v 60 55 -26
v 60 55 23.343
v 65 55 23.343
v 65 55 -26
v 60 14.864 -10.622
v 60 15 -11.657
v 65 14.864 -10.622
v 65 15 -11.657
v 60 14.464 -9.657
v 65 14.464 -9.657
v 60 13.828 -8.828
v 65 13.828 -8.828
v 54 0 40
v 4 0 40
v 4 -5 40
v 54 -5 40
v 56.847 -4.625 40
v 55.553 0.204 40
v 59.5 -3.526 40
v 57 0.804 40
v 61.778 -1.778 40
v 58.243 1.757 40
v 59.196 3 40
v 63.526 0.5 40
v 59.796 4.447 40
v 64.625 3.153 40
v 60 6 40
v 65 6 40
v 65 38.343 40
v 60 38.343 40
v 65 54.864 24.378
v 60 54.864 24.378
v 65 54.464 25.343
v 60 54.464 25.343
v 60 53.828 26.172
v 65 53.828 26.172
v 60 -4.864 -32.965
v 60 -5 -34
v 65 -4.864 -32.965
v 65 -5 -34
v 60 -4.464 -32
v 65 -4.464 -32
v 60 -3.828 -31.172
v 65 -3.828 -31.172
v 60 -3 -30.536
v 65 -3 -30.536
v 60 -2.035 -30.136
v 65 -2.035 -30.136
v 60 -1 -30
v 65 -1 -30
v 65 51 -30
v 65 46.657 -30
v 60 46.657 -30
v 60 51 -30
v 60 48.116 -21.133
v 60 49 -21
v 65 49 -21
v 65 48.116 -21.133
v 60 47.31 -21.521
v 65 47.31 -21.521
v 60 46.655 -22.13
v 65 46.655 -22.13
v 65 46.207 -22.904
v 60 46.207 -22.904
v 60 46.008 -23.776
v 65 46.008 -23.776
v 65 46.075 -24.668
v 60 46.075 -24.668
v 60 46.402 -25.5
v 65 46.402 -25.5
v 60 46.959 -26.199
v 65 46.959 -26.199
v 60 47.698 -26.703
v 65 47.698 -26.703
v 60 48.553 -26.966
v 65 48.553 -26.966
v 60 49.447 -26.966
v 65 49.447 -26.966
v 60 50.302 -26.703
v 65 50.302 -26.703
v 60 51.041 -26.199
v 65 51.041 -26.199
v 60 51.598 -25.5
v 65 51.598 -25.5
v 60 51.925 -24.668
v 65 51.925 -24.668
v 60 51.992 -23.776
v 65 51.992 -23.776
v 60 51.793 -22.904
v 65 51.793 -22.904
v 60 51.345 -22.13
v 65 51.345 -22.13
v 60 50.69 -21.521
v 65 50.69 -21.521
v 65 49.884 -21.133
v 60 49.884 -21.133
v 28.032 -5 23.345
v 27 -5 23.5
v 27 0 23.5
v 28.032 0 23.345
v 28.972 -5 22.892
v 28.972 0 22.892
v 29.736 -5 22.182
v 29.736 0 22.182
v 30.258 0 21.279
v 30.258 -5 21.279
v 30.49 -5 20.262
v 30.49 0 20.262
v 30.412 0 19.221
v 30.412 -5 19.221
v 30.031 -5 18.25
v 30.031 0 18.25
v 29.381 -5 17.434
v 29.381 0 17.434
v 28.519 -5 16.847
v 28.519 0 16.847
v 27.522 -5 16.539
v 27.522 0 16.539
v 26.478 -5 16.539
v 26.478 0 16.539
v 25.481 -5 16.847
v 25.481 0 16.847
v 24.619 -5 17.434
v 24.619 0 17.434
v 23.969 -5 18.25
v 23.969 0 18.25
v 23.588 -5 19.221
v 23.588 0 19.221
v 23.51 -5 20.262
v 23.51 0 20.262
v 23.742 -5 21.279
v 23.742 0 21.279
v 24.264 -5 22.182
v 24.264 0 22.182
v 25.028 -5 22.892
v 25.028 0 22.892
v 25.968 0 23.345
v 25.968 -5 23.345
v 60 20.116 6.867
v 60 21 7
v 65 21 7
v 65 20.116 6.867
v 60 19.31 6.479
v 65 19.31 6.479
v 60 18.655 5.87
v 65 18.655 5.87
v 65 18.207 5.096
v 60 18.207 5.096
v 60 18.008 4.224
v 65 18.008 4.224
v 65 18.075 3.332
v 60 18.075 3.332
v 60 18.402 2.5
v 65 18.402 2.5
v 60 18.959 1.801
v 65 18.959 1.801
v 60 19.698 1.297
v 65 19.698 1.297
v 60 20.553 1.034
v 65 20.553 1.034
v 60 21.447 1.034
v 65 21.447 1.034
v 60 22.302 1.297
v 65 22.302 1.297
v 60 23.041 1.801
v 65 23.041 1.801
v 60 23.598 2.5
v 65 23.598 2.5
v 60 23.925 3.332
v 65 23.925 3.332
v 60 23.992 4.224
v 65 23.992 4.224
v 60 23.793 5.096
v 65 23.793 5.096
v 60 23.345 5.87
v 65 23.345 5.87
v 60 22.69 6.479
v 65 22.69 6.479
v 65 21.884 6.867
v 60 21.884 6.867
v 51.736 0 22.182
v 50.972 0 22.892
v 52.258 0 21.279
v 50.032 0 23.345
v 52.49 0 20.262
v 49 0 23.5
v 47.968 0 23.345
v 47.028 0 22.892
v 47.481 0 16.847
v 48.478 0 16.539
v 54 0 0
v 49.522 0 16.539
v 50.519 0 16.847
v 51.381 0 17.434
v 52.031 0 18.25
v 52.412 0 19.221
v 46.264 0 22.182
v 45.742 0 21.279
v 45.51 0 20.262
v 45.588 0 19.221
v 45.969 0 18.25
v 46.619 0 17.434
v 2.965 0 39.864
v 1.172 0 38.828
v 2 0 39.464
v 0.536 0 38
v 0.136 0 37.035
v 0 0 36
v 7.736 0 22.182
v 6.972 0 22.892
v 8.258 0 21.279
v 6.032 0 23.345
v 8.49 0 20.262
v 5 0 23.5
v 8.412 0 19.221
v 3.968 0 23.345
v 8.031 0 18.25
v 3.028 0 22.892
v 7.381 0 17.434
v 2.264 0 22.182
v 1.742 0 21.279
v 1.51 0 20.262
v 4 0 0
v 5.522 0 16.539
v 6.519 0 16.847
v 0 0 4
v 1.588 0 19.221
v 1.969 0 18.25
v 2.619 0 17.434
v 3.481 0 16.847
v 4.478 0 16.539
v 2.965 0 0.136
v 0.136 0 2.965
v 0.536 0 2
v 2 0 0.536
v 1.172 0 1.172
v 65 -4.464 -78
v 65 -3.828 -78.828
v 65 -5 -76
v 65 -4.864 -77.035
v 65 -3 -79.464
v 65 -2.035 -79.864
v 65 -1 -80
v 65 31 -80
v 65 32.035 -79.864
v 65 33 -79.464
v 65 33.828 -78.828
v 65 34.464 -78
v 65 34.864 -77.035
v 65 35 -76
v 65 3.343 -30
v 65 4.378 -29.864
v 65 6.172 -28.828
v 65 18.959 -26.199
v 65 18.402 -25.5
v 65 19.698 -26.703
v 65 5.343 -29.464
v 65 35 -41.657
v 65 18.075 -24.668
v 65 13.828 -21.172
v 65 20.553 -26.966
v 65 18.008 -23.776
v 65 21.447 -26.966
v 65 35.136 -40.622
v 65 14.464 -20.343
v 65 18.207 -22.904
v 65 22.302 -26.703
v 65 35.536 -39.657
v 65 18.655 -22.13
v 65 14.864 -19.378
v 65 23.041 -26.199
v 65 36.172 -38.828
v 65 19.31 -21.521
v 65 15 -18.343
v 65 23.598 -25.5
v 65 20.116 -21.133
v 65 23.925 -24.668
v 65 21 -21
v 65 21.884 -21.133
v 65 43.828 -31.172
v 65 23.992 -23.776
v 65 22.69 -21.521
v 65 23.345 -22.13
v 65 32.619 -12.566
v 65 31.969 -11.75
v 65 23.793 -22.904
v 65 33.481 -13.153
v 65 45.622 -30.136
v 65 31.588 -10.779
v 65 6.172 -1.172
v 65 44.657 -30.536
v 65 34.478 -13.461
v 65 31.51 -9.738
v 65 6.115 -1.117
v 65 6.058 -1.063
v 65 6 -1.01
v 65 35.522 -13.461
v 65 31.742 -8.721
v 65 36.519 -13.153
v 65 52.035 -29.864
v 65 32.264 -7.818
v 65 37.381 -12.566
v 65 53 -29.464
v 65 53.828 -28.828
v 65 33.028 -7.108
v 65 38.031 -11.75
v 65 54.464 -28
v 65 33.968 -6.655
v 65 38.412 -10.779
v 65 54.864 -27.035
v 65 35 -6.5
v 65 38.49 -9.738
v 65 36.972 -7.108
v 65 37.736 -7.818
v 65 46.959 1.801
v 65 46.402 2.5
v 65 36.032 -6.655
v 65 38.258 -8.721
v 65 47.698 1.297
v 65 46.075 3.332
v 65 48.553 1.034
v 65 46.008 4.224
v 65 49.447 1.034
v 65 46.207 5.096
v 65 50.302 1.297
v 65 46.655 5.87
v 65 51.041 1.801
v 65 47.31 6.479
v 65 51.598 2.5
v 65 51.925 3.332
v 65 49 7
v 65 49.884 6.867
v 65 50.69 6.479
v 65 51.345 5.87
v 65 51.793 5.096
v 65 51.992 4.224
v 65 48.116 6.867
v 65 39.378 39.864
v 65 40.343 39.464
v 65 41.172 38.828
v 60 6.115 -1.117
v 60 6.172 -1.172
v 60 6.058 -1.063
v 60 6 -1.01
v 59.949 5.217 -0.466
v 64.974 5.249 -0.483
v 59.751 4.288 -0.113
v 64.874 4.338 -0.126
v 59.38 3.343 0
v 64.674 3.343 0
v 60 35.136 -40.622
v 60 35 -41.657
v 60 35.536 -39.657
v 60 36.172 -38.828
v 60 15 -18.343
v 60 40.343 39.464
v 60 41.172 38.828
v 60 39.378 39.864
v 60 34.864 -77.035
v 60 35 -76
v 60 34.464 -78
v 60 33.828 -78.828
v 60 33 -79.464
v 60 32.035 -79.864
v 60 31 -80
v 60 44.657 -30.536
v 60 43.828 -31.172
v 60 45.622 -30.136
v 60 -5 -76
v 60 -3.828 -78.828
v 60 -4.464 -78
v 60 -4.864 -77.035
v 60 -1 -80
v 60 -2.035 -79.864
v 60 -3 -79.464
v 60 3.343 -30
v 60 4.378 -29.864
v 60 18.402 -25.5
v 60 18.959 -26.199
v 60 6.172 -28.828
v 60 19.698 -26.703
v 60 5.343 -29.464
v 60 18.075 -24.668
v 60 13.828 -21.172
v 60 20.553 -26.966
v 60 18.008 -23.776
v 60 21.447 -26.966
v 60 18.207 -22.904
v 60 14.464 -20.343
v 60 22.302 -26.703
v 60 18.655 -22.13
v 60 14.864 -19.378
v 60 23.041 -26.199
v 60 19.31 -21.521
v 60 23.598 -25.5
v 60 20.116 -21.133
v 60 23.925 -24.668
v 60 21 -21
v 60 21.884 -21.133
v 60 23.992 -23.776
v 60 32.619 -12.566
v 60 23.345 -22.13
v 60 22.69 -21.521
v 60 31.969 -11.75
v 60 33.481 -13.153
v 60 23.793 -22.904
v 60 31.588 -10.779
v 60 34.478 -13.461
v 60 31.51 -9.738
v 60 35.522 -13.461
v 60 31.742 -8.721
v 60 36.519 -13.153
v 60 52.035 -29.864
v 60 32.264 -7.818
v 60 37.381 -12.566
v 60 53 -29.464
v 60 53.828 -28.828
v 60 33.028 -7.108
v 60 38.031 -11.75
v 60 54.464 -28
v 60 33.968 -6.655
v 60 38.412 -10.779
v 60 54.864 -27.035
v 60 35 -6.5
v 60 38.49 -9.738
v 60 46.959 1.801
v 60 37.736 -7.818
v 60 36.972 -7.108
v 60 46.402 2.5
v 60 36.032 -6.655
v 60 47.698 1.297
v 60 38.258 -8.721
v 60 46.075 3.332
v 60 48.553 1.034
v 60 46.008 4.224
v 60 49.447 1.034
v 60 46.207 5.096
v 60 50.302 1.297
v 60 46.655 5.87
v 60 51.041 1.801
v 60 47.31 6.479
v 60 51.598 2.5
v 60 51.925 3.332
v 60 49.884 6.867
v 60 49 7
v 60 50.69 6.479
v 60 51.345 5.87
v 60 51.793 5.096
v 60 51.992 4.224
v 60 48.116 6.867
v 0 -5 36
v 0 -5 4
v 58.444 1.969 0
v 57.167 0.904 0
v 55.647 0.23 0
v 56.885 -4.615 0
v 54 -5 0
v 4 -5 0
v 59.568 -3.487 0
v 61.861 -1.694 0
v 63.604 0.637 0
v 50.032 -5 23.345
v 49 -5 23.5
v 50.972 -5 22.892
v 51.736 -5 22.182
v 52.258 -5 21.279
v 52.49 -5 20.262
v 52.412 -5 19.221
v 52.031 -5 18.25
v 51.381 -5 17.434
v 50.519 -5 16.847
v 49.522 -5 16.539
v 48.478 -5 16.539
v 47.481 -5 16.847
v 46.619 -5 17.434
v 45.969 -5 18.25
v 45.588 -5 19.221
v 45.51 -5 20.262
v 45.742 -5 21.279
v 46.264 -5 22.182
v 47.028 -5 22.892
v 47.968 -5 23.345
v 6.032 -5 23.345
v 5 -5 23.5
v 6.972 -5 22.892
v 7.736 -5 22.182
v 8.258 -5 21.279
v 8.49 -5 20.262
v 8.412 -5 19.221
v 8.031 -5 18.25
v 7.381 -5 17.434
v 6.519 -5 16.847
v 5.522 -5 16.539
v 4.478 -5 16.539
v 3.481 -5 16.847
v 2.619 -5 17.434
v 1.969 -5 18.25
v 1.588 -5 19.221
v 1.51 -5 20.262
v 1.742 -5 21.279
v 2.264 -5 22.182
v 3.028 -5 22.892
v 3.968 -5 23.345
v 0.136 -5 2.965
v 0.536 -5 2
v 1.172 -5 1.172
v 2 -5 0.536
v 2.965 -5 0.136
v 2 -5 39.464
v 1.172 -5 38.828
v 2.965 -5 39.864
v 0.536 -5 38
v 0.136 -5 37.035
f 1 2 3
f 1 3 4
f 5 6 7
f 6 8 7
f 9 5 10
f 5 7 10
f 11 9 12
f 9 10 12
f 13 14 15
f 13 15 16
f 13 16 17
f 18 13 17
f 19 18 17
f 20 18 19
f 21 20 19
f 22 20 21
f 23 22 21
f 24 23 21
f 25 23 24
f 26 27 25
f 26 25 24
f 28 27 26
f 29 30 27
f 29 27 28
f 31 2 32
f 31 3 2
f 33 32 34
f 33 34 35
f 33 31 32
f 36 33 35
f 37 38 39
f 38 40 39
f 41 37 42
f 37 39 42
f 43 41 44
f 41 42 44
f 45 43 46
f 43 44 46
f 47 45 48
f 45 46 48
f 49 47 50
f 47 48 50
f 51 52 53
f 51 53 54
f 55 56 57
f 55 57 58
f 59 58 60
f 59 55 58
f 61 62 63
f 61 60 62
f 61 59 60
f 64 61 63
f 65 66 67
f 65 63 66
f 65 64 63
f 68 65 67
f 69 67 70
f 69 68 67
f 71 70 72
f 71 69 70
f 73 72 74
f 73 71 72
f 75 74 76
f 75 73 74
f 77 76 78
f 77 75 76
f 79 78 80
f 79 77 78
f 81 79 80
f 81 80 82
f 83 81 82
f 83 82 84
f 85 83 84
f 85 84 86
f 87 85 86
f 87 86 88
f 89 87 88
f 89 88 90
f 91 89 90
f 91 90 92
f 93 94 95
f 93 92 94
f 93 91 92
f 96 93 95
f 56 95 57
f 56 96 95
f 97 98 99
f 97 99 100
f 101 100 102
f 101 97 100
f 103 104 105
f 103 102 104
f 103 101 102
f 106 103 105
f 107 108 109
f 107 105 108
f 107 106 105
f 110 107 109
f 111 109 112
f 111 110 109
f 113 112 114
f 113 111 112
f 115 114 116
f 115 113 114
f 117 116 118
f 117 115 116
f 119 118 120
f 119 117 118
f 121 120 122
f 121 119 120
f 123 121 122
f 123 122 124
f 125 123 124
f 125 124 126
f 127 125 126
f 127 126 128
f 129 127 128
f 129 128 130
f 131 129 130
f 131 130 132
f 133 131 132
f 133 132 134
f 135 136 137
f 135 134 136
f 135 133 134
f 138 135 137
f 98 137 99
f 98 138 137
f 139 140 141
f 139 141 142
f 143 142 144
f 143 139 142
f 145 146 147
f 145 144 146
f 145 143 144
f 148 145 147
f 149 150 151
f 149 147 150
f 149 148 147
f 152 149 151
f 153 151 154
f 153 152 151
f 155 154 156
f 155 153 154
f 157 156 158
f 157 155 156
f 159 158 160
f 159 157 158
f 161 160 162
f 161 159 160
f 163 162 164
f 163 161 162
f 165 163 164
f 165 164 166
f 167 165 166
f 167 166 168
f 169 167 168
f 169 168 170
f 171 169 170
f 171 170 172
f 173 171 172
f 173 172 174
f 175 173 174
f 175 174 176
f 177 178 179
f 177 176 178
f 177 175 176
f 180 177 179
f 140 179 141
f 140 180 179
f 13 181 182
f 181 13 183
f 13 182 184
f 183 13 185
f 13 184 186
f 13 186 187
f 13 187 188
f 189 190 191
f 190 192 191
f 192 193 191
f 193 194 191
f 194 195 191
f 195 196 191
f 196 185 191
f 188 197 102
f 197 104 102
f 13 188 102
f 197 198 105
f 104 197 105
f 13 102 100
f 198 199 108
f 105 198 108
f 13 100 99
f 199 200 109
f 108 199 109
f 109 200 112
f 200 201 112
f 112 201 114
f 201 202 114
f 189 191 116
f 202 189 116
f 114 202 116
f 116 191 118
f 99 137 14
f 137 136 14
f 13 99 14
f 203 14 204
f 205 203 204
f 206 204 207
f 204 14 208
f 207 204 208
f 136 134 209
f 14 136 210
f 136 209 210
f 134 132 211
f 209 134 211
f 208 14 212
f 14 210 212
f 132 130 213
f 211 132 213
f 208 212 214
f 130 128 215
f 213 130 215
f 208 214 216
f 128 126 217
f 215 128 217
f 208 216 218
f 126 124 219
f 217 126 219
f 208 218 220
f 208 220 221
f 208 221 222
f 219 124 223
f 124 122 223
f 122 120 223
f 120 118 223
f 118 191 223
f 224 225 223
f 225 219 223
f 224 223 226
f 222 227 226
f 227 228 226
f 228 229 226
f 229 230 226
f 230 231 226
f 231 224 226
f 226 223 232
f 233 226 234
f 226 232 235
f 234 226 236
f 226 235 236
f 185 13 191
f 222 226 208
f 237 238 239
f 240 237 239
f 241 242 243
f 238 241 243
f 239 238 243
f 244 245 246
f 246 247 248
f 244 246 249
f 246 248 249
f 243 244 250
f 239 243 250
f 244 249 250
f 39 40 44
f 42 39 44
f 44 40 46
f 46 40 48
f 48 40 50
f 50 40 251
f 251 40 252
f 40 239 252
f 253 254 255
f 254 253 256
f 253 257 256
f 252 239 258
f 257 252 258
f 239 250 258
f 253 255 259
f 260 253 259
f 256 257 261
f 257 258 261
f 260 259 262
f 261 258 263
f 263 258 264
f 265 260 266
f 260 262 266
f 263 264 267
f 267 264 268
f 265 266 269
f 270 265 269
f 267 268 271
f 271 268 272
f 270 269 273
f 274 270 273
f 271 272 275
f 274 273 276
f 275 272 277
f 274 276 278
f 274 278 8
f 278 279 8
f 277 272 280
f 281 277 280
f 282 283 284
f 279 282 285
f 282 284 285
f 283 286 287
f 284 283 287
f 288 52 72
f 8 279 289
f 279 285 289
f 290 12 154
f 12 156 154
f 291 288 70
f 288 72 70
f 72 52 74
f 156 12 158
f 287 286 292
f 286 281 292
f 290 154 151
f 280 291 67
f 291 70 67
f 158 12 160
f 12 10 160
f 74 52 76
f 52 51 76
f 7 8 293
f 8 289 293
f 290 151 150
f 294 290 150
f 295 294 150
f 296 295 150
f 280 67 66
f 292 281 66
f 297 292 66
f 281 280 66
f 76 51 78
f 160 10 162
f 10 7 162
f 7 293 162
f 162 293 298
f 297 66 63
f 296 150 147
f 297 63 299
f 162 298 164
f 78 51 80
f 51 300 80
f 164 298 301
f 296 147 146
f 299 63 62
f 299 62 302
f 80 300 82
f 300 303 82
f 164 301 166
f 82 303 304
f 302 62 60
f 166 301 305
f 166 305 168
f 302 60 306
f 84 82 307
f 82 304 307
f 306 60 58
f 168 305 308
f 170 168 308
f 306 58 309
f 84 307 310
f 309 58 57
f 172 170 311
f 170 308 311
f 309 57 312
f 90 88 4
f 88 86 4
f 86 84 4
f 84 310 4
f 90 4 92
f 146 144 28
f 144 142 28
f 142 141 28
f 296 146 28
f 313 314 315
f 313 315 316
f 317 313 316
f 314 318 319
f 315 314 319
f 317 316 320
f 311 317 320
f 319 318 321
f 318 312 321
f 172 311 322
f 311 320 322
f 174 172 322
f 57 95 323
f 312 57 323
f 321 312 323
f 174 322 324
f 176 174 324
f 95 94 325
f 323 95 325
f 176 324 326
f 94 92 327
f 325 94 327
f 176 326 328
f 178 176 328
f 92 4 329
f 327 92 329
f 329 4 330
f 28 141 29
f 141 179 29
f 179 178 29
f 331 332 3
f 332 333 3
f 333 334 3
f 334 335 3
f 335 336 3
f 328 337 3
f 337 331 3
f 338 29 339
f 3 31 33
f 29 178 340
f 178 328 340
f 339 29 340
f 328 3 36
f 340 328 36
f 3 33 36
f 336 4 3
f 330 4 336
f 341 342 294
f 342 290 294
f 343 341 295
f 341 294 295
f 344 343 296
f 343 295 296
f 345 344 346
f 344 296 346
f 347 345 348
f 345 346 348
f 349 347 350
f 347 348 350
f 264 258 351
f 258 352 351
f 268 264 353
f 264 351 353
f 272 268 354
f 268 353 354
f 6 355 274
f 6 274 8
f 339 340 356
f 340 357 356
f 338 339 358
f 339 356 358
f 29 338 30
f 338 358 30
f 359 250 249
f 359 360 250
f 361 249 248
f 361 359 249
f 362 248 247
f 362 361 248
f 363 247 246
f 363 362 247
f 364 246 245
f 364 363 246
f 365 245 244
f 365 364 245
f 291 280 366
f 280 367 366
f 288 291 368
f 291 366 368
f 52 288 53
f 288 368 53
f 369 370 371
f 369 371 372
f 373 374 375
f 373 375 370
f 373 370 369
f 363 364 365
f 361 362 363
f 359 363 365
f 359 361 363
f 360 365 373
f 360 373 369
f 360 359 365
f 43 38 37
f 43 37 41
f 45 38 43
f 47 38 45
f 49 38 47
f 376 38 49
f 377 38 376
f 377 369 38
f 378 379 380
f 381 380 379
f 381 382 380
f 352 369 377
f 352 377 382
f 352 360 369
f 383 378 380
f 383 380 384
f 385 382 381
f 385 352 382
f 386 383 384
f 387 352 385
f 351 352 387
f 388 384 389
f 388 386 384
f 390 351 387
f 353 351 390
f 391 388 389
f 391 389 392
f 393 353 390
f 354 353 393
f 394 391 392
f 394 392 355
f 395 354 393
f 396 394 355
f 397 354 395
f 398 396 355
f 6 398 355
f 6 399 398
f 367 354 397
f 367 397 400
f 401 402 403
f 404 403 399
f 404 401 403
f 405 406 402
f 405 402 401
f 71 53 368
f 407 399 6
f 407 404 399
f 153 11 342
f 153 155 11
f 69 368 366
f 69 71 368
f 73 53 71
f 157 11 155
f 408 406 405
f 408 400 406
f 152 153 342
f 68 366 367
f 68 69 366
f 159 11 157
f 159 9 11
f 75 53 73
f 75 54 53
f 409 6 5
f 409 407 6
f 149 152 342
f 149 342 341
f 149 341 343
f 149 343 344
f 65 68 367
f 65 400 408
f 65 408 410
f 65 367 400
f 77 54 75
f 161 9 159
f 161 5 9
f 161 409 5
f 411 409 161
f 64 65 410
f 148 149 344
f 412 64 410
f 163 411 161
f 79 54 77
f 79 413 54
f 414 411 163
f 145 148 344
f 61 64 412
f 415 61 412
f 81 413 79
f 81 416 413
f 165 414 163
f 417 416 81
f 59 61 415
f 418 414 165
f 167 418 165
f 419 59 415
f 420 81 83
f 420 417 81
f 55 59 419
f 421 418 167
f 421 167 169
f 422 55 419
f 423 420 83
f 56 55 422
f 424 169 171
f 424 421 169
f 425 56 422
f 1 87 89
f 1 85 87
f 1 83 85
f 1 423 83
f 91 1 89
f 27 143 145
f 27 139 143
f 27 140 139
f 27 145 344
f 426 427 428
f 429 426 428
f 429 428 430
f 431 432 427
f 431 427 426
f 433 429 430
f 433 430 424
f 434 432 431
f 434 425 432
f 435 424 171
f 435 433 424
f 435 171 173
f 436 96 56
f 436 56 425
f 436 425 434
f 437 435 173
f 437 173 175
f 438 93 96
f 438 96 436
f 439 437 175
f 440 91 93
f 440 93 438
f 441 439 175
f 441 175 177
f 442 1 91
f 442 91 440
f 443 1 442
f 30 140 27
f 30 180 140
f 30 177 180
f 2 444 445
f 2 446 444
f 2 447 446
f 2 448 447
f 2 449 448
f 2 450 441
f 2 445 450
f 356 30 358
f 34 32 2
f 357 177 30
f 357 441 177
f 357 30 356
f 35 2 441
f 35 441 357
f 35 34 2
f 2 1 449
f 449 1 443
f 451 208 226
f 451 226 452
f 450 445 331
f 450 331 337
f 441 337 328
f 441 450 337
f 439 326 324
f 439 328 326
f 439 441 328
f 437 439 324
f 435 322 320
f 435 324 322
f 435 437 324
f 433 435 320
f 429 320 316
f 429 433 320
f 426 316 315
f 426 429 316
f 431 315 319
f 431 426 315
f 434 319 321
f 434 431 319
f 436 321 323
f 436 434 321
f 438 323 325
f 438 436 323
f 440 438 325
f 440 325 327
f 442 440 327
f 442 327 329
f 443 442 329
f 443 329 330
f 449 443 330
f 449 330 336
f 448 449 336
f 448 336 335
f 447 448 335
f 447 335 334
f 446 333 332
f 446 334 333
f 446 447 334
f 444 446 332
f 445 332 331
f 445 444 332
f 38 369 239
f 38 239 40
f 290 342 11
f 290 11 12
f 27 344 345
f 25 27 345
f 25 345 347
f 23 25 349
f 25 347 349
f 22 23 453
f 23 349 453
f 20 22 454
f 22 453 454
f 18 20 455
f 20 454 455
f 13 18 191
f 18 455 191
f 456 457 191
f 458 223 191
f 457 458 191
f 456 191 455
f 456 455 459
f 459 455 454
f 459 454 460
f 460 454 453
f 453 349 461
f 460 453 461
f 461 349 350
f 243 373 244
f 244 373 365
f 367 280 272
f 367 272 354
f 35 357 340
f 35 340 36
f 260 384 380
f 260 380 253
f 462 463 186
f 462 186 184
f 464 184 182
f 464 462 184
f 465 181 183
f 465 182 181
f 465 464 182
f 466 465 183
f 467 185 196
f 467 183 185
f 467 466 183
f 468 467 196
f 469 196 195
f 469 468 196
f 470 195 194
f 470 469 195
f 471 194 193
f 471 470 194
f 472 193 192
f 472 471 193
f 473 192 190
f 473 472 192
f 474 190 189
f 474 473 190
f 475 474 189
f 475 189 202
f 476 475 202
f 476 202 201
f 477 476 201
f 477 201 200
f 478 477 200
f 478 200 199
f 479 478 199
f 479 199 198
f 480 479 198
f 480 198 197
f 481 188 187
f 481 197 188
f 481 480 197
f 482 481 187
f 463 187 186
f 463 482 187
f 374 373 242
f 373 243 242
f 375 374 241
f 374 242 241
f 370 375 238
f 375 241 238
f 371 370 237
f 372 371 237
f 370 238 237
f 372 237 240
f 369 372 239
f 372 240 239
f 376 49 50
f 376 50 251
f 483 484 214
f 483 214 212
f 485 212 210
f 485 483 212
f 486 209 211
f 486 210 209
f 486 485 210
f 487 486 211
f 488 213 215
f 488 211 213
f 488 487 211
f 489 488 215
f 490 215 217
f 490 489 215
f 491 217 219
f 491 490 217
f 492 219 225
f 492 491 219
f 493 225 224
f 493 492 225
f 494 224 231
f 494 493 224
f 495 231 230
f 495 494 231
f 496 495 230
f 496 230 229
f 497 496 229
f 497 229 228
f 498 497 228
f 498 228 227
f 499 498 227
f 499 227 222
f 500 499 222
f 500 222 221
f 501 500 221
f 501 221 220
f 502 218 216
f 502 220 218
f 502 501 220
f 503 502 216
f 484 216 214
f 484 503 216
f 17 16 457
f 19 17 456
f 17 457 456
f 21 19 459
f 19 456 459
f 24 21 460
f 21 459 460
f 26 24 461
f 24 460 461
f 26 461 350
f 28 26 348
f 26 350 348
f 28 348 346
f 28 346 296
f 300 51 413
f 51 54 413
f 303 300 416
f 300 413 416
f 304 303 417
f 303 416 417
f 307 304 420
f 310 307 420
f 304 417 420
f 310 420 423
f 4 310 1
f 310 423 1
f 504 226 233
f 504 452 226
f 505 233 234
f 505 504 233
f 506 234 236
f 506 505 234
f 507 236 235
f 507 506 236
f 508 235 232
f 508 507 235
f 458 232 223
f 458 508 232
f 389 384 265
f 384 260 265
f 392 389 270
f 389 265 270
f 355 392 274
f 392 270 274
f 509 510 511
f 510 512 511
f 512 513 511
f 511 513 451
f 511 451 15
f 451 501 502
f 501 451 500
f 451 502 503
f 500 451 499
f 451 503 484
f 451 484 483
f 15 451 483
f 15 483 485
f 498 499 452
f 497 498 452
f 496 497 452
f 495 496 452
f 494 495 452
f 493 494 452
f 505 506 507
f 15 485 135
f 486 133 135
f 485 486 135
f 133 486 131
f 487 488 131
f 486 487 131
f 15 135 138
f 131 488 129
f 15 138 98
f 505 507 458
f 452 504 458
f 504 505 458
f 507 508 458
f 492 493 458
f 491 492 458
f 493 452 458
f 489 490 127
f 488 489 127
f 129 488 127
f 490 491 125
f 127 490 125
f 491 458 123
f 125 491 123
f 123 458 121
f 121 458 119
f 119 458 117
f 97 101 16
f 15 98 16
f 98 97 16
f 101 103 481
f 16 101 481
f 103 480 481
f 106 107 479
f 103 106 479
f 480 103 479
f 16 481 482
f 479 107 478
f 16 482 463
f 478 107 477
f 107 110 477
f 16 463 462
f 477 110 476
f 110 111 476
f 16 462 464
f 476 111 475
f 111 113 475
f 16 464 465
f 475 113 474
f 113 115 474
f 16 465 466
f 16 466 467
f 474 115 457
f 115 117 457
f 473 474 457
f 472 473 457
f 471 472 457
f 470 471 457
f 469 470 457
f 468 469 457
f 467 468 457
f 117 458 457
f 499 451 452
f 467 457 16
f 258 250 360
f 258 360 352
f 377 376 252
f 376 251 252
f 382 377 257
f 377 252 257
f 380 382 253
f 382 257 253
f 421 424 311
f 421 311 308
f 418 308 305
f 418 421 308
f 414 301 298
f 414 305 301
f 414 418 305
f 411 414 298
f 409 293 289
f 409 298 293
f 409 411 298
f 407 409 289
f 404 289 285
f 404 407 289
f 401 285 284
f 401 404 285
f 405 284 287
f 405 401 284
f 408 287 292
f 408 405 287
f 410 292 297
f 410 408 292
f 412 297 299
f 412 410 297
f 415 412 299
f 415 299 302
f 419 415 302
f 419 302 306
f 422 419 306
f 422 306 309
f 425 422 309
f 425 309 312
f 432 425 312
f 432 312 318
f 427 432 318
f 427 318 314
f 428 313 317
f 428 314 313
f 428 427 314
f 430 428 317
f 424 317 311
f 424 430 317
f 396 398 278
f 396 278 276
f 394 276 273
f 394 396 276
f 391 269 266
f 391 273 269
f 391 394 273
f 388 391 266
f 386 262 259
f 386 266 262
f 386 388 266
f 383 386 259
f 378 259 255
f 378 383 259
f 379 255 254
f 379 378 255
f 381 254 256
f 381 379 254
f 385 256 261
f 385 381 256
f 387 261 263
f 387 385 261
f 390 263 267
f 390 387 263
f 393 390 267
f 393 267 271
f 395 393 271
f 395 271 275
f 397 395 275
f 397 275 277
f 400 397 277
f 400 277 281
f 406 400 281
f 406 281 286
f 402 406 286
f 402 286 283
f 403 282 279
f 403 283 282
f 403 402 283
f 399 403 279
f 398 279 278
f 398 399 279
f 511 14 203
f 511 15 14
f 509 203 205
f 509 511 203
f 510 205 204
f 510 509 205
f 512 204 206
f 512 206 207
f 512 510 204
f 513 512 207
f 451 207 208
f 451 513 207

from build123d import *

# Parameters (mm, degrees)
T_LE_DE_BASE_PLI_E1_DEPTH    = 40
BOSS_EXTRU_1_DEPTH           = 5
ENL_V_MAT_EXTRU_1_DEPTH      = 117.833214455
ENL_V_MAT_EXTRU_1_DEPTH_BACK = 117.833214455
ESQUISSE8_R                  = 3.5
ESQUISSE8_R_2                = 3
ESQUISSE10_W                 = 50
ESQUISSE10_H                 = 20
BOSS_EXTRU_2_DEPTH           = 5
ENL_V_MAT_EXTRU_2_DEPTH      = 117.833214455
ENL_V_MAT_EXTRU_2_DEPTH_BACK = 117.833214455
ESQUISSE9_R                  = 3.5
ENL_V_MAT_EXTRU_3_DEPTH      = 115.127122105
ENL_V_MAT_EXTRU_3_DEPTH_BACK = 115.127122105
ESQUISSE11_W                 = 50
ESQUISSE11_H                 = 20
CHANFREIN1_SIZE              = 10
CONG_1_R                     = 4


# Read off the part's stored shape, not the designer's step: Tôle de base pliée1
with BuildPart() as part:
    # Tôle de base pliée1 outline → Tôle de base pliée1 (new body)
    with BuildSketch(Plane.XY):
        with BuildLine():
            Line((65, 6), (65, 40))
            Line((65, 40), (60, 40))
            Line((60, 40), (60, 6))
            ThreePointArc((60, 6), (58.242640687, 1.757359313), (54, 0))
            Line((54, 0), (0, 0))
            Line((0, 0), (0, -5))
            Line((0, -5), (54, -5))
            ThreePointArc((54, -5), (61.778174593, -1.778174593), (65, 6))
        make_face()
    extrude(amount=T_LE_DE_BASE_PLI_E1_DEPTH)

    # Esquisse7 → Boss.-Extru.1 (add)
    with BuildSketch(Plane.ZY.offset(-60)):
        Polygon((25, 55), (-80, 55), (-80, 15), (0, 15), (40, 40), align=None)
    extrude(amount=-BOSS_EXTRU_1_DEPTH)

    # Esquisse8 → Enlèv. mat.-Extru.1 (cut, two sides: drawn at the far end of the back side and taken through both)
    with BuildSketch(Plane(origin=(65, 0, 0), x_dir=(0, 0, -1), z_dir=(1, 0, 0)).offset(-ENL_V_MAT_EXTRU_1_DEPTH_BACK)):
        with Locations(Location((10, 35, 0), (0, 0, 180))):
            Circle(ESQUISSE8_R)
        with Locations(Location((24, 49, 0), (0, 0, 180))):
            Circle(ESQUISSE8_R_2)
        with Locations(Location((24, 21, 0), (0, 0, 180))):
            Circle(ESQUISSE8_R_2)
        with Locations(Location((-4, 21, 0), (0, 0, 180))):
            Circle(ESQUISSE8_R_2)
        with Locations(Location((-4, 49, 0), (0, 0, 180))):
            Circle(ESQUISSE8_R_2)
    extrude(amount=ENL_V_MAT_EXTRU_1_DEPTH + ENL_V_MAT_EXTRU_1_DEPTH_BACK, mode=Mode.SUBTRACT)

    # Esquisse10 → Boss.-Extru.2 (add)
    with BuildSketch(Plane.ZY.offset(-60)):
        with Locations((-55, 5)):
            Rectangle(ESQUISSE10_W, ESQUISSE10_H)
    extrude(amount=-BOSS_EXTRU_2_DEPTH)

    # Esquisse9 → Enlèv. mat.-Extru.2 (cut, two sides: drawn at the far end of the back side and taken through both)
    with BuildSketch(Plane(origin=(0, 0, 0), x_dir=(1, 0, 0), z_dir=(0, 1, 0)).offset(-ENL_V_MAT_EXTRU_2_DEPTH_BACK)):
        with Locations(Location((5, -20, 0), (0, 0, 270))):
            Circle(ESQUISSE9_R)
        with Locations(Location((27, -20, 0), (0, 0, 270))):
            Circle(ESQUISSE9_R)
        with Locations(Location((49, -20, 0), (0, 0, 270))):
            Circle(ESQUISSE9_R)
    extrude(amount=ENL_V_MAT_EXTRU_2_DEPTH + ENL_V_MAT_EXTRU_2_DEPTH_BACK, mode=Mode.SUBTRACT)

    # Esquisse11 → Enlèv. mat.-Extru.3 (cut, two sides: drawn at the far end of the back side and taken through both)
    with BuildSketch(Plane.ZY.offset(-60).offset(-ENL_V_MAT_EXTRU_3_DEPTH_BACK)):
        with Locations((-55, 45)):
            Rectangle(ESQUISSE11_W, ESQUISSE11_H)
    extrude(amount=ENL_V_MAT_EXTRU_3_DEPTH + ENL_V_MAT_EXTRU_3_DEPTH_BACK, mode=Mode.SUBTRACT)

    # Chanfrein1
    chanfrein1_edges = [part.edges().sort_by_distance(p)[0] for p in [
        (62.5, 15, 0),
        (62.5, 15, -30),
        (62.5, 35, -30),
    ]]
    chamfer(chanfrein1_edges, length=CHANFREIN1_SIZE)

    # Congé1
    cong_1_edges = [part.edges().sort_by_distance(p)[0] for p in [
        (62.5, 55, -30),
        (62.5, 35, -80),
        (62.5, 35, -40),
        (62.5, 45, -30),
        (62.5, 5, -30),
        (62.5, 15, -10),
        (62.5, 15, -20),
        (62.435265467, 5, 0),
        (0, -2.5, 40),
        (62.5, 55, 25),
        (62.5, 40, 40),
        (0, -2.5, 0),
        (62.5, -5, -80),
        (62.5, -5, -30),
    ]]
    fillet(cong_1_edges, radius=CONG_1_R)


solid = part.part
